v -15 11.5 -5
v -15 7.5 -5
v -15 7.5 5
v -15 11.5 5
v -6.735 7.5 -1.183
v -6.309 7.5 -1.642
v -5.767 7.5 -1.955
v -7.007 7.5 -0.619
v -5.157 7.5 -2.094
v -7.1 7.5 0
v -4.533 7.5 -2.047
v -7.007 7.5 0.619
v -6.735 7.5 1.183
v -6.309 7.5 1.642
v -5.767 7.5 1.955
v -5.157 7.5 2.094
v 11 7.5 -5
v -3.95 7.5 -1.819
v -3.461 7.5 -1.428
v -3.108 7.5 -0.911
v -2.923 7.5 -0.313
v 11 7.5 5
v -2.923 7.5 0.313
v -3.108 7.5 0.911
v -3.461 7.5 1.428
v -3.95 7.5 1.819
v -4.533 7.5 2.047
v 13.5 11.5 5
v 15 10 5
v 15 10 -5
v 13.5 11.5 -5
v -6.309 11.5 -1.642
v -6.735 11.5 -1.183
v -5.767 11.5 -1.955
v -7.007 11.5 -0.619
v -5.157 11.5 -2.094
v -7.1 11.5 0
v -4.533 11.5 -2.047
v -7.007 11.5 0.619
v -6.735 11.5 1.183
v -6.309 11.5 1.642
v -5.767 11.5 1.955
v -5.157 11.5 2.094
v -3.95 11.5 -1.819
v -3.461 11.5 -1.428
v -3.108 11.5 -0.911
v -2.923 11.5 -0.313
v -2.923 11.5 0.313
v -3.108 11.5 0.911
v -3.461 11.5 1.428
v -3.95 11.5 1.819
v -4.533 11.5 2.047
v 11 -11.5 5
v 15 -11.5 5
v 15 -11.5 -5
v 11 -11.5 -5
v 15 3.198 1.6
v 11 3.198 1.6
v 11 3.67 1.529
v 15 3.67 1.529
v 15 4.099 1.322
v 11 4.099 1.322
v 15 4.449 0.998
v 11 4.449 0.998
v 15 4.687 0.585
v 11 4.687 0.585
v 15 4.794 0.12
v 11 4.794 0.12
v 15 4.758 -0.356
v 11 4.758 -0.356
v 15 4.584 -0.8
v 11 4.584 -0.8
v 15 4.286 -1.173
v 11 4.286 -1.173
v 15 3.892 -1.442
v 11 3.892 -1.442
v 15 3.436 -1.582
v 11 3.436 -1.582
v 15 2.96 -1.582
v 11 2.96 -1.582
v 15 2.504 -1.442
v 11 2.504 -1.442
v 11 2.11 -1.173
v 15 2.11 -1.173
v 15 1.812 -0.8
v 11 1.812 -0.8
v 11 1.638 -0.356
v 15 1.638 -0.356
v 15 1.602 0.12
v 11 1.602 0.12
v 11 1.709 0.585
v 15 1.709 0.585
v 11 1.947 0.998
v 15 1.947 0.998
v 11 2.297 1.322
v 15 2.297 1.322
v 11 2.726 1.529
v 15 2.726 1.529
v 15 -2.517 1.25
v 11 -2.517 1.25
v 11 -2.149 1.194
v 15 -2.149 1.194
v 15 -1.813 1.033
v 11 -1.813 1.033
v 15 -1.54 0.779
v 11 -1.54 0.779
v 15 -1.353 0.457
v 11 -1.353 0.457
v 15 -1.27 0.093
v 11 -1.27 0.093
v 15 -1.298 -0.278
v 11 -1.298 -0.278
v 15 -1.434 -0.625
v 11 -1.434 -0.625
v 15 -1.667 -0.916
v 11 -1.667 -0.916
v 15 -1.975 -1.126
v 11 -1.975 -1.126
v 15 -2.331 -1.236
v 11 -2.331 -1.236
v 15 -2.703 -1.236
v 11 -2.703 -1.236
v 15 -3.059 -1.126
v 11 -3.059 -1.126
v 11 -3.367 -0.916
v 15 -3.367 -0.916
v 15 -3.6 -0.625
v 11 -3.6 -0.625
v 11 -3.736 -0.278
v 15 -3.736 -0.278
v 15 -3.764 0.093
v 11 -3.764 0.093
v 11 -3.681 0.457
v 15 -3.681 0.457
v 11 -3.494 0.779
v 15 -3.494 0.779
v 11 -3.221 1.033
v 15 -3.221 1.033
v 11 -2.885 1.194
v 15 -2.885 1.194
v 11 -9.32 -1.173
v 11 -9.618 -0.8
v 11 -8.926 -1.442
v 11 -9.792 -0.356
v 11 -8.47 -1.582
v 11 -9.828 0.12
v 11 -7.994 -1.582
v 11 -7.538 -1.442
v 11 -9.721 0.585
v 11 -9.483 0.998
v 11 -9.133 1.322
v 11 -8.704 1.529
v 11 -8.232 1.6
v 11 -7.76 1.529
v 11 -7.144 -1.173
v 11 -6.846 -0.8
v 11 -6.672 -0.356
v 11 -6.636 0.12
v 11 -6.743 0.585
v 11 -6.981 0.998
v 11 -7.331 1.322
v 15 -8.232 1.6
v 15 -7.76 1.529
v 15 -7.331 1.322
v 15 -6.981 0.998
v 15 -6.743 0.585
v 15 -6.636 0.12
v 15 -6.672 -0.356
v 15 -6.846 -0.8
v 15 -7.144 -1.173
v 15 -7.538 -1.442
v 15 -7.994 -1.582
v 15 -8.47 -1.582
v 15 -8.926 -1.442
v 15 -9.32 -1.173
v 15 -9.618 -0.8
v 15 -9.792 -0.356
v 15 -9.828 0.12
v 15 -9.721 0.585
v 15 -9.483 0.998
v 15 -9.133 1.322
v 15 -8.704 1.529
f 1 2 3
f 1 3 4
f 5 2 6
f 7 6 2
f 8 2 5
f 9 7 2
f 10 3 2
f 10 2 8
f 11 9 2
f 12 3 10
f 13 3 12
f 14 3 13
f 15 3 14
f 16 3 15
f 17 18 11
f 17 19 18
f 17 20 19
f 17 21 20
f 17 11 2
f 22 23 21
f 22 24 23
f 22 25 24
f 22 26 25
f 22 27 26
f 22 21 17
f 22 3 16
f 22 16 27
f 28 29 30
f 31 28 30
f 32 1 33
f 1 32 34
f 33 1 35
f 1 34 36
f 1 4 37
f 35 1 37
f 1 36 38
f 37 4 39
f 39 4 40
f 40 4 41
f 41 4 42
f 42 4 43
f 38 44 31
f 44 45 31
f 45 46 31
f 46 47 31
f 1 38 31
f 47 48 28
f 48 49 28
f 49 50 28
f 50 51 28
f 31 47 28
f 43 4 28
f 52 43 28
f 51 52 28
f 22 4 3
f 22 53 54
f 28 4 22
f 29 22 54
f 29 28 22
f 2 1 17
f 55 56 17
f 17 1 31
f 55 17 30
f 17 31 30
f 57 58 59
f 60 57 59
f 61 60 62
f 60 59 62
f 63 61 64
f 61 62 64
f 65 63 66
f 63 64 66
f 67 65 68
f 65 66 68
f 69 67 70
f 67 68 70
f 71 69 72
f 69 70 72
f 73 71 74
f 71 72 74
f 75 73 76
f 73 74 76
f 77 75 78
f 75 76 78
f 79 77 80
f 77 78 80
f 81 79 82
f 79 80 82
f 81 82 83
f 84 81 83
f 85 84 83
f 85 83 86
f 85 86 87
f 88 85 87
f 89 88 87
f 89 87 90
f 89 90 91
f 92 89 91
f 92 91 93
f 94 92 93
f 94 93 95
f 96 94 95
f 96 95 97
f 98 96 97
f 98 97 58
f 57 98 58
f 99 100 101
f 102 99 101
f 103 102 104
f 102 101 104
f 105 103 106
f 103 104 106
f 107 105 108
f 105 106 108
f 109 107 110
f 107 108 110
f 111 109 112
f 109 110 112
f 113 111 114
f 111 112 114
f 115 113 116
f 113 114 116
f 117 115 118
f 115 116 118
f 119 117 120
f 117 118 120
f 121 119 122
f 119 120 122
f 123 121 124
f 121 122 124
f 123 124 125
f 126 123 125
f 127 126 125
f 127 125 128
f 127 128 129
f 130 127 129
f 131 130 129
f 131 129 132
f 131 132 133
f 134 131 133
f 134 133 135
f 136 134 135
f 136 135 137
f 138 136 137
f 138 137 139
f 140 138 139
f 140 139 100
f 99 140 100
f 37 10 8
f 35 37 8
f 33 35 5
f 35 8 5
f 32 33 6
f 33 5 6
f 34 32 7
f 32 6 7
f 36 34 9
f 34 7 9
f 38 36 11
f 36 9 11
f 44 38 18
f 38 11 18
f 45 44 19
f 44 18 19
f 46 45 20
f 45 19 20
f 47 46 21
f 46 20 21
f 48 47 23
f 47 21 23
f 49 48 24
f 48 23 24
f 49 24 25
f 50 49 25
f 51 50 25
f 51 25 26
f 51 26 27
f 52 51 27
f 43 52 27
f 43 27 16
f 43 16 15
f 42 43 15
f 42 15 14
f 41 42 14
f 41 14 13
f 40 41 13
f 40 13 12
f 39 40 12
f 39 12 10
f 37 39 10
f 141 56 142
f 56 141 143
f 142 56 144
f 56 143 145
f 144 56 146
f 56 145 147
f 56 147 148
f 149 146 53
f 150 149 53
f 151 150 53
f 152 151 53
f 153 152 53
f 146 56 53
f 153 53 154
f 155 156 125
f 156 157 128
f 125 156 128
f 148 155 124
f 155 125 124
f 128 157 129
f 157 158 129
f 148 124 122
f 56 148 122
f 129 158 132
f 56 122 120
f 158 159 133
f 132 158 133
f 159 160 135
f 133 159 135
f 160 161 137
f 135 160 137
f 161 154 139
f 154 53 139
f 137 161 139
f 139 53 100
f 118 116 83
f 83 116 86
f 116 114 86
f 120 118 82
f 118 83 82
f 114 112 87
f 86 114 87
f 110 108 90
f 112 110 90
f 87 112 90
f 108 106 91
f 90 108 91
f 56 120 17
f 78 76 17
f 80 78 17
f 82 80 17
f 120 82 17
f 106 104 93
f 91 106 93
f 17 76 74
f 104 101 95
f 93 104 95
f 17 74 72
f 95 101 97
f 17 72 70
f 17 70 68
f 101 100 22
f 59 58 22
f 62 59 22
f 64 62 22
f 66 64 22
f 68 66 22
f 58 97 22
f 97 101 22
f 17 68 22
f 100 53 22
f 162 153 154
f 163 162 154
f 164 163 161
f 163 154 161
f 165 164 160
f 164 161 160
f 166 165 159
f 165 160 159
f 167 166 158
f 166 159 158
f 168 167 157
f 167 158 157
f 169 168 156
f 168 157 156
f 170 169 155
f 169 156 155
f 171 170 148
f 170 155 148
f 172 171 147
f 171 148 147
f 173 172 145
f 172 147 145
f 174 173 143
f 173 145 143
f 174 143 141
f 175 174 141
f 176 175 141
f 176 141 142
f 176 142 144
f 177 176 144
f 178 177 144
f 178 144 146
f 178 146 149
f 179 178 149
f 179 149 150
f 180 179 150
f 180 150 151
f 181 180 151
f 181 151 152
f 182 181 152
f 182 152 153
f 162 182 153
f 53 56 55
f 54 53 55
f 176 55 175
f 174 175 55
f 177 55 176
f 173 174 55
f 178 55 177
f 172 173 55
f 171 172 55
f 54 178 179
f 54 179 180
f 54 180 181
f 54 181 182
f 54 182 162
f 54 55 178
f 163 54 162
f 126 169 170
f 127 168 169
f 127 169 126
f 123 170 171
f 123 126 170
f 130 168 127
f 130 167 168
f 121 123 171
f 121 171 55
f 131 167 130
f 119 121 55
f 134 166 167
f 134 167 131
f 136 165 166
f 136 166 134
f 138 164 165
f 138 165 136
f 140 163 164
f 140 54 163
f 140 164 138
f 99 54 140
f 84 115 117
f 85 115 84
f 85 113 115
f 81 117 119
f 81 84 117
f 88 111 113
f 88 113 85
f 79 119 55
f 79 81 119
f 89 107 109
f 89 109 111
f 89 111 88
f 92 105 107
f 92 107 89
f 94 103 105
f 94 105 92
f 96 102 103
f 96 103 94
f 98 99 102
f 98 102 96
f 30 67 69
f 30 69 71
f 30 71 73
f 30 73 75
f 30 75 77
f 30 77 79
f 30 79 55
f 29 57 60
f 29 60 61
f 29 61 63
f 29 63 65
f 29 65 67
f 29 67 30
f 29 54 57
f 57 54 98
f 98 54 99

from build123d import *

# Parameters (mm, degrees)
SKETCH1_W                          = 30
SKETCH1_H                          = 23
BOSS_EXTRUDE1_DEPTH                = 5
SKETCH2_W                          = 26
SKETCH2_H                          = 19
CUT_EXTRUDE1_DEPTH                 = 22.38340478
CHAMFER1_SIZE                      = 1.5
TAPPED_HOLE_FOR_M4X0_7_HELICOIL1_D = 4.2
M3_CLEARANCE_HOLE1_D               = 3.2
M3_TAPPED_HOLE1_D                  = 2.5


with BuildPart() as part:
    # Sketch1 → Boss-Extrude1 (new, symmetric)
    with BuildSketch(Plane.XY):
        Rectangle(SKETCH1_W, SKETCH1_H)
    extrude(amount=BOSS_EXTRUDE1_DEPTH, both=True)

    # Sketch2 → Cut-Extrude1 (cut, through all)
    with BuildSketch(Plane.XY.offset(5)):
        with Locations((-2, -2)):
            Rectangle(SKETCH2_W, SKETCH2_H)
    extrude(amount=-CUT_EXTRUDE1_DEPTH, mode=Mode.SUBTRACT)

    # Chamfer1
    chamfer1_edges = [part.edges().sort_by_distance(p)[0] for p in [
        (15, 11.5, 0),
    ]]
    chamfer(chamfer1_edges, length=CHAMFER1_SIZE)

    # Tapped Hole for M4x0.7 Helicoil1 (through all)
    with Locations(Plane(origin=(0, 11.5, 0), x_dir=(1, 0, 0), z_dir=(0, 1, 0))):
        with Locations((-5, 0)):
            Hole(TAPPED_HOLE_FOR_M4X0_7_HELICOIL1_D / 2)

    # M3 Clearance Hole1 (through all)
    with Locations(Plane(origin=(15, 0, 0), x_dir=(0, 0, -1), z_dir=(1, 0, 0))):
        with Locations((0, -8.232), (0, 3.198)):
            Hole(M3_CLEARANCE_HOLE1_D / 2)

    # M3 Tapped Hole1 (through all)
    with Locations(Plane(origin=(15, 0, 0), x_dir=(0, 0, -1), z_dir=(1, 0, 0))):
        with Locations((0, -2.517)):
            Hole(M3_TAPPED_HOLE1_D / 2)


solid = part.part
